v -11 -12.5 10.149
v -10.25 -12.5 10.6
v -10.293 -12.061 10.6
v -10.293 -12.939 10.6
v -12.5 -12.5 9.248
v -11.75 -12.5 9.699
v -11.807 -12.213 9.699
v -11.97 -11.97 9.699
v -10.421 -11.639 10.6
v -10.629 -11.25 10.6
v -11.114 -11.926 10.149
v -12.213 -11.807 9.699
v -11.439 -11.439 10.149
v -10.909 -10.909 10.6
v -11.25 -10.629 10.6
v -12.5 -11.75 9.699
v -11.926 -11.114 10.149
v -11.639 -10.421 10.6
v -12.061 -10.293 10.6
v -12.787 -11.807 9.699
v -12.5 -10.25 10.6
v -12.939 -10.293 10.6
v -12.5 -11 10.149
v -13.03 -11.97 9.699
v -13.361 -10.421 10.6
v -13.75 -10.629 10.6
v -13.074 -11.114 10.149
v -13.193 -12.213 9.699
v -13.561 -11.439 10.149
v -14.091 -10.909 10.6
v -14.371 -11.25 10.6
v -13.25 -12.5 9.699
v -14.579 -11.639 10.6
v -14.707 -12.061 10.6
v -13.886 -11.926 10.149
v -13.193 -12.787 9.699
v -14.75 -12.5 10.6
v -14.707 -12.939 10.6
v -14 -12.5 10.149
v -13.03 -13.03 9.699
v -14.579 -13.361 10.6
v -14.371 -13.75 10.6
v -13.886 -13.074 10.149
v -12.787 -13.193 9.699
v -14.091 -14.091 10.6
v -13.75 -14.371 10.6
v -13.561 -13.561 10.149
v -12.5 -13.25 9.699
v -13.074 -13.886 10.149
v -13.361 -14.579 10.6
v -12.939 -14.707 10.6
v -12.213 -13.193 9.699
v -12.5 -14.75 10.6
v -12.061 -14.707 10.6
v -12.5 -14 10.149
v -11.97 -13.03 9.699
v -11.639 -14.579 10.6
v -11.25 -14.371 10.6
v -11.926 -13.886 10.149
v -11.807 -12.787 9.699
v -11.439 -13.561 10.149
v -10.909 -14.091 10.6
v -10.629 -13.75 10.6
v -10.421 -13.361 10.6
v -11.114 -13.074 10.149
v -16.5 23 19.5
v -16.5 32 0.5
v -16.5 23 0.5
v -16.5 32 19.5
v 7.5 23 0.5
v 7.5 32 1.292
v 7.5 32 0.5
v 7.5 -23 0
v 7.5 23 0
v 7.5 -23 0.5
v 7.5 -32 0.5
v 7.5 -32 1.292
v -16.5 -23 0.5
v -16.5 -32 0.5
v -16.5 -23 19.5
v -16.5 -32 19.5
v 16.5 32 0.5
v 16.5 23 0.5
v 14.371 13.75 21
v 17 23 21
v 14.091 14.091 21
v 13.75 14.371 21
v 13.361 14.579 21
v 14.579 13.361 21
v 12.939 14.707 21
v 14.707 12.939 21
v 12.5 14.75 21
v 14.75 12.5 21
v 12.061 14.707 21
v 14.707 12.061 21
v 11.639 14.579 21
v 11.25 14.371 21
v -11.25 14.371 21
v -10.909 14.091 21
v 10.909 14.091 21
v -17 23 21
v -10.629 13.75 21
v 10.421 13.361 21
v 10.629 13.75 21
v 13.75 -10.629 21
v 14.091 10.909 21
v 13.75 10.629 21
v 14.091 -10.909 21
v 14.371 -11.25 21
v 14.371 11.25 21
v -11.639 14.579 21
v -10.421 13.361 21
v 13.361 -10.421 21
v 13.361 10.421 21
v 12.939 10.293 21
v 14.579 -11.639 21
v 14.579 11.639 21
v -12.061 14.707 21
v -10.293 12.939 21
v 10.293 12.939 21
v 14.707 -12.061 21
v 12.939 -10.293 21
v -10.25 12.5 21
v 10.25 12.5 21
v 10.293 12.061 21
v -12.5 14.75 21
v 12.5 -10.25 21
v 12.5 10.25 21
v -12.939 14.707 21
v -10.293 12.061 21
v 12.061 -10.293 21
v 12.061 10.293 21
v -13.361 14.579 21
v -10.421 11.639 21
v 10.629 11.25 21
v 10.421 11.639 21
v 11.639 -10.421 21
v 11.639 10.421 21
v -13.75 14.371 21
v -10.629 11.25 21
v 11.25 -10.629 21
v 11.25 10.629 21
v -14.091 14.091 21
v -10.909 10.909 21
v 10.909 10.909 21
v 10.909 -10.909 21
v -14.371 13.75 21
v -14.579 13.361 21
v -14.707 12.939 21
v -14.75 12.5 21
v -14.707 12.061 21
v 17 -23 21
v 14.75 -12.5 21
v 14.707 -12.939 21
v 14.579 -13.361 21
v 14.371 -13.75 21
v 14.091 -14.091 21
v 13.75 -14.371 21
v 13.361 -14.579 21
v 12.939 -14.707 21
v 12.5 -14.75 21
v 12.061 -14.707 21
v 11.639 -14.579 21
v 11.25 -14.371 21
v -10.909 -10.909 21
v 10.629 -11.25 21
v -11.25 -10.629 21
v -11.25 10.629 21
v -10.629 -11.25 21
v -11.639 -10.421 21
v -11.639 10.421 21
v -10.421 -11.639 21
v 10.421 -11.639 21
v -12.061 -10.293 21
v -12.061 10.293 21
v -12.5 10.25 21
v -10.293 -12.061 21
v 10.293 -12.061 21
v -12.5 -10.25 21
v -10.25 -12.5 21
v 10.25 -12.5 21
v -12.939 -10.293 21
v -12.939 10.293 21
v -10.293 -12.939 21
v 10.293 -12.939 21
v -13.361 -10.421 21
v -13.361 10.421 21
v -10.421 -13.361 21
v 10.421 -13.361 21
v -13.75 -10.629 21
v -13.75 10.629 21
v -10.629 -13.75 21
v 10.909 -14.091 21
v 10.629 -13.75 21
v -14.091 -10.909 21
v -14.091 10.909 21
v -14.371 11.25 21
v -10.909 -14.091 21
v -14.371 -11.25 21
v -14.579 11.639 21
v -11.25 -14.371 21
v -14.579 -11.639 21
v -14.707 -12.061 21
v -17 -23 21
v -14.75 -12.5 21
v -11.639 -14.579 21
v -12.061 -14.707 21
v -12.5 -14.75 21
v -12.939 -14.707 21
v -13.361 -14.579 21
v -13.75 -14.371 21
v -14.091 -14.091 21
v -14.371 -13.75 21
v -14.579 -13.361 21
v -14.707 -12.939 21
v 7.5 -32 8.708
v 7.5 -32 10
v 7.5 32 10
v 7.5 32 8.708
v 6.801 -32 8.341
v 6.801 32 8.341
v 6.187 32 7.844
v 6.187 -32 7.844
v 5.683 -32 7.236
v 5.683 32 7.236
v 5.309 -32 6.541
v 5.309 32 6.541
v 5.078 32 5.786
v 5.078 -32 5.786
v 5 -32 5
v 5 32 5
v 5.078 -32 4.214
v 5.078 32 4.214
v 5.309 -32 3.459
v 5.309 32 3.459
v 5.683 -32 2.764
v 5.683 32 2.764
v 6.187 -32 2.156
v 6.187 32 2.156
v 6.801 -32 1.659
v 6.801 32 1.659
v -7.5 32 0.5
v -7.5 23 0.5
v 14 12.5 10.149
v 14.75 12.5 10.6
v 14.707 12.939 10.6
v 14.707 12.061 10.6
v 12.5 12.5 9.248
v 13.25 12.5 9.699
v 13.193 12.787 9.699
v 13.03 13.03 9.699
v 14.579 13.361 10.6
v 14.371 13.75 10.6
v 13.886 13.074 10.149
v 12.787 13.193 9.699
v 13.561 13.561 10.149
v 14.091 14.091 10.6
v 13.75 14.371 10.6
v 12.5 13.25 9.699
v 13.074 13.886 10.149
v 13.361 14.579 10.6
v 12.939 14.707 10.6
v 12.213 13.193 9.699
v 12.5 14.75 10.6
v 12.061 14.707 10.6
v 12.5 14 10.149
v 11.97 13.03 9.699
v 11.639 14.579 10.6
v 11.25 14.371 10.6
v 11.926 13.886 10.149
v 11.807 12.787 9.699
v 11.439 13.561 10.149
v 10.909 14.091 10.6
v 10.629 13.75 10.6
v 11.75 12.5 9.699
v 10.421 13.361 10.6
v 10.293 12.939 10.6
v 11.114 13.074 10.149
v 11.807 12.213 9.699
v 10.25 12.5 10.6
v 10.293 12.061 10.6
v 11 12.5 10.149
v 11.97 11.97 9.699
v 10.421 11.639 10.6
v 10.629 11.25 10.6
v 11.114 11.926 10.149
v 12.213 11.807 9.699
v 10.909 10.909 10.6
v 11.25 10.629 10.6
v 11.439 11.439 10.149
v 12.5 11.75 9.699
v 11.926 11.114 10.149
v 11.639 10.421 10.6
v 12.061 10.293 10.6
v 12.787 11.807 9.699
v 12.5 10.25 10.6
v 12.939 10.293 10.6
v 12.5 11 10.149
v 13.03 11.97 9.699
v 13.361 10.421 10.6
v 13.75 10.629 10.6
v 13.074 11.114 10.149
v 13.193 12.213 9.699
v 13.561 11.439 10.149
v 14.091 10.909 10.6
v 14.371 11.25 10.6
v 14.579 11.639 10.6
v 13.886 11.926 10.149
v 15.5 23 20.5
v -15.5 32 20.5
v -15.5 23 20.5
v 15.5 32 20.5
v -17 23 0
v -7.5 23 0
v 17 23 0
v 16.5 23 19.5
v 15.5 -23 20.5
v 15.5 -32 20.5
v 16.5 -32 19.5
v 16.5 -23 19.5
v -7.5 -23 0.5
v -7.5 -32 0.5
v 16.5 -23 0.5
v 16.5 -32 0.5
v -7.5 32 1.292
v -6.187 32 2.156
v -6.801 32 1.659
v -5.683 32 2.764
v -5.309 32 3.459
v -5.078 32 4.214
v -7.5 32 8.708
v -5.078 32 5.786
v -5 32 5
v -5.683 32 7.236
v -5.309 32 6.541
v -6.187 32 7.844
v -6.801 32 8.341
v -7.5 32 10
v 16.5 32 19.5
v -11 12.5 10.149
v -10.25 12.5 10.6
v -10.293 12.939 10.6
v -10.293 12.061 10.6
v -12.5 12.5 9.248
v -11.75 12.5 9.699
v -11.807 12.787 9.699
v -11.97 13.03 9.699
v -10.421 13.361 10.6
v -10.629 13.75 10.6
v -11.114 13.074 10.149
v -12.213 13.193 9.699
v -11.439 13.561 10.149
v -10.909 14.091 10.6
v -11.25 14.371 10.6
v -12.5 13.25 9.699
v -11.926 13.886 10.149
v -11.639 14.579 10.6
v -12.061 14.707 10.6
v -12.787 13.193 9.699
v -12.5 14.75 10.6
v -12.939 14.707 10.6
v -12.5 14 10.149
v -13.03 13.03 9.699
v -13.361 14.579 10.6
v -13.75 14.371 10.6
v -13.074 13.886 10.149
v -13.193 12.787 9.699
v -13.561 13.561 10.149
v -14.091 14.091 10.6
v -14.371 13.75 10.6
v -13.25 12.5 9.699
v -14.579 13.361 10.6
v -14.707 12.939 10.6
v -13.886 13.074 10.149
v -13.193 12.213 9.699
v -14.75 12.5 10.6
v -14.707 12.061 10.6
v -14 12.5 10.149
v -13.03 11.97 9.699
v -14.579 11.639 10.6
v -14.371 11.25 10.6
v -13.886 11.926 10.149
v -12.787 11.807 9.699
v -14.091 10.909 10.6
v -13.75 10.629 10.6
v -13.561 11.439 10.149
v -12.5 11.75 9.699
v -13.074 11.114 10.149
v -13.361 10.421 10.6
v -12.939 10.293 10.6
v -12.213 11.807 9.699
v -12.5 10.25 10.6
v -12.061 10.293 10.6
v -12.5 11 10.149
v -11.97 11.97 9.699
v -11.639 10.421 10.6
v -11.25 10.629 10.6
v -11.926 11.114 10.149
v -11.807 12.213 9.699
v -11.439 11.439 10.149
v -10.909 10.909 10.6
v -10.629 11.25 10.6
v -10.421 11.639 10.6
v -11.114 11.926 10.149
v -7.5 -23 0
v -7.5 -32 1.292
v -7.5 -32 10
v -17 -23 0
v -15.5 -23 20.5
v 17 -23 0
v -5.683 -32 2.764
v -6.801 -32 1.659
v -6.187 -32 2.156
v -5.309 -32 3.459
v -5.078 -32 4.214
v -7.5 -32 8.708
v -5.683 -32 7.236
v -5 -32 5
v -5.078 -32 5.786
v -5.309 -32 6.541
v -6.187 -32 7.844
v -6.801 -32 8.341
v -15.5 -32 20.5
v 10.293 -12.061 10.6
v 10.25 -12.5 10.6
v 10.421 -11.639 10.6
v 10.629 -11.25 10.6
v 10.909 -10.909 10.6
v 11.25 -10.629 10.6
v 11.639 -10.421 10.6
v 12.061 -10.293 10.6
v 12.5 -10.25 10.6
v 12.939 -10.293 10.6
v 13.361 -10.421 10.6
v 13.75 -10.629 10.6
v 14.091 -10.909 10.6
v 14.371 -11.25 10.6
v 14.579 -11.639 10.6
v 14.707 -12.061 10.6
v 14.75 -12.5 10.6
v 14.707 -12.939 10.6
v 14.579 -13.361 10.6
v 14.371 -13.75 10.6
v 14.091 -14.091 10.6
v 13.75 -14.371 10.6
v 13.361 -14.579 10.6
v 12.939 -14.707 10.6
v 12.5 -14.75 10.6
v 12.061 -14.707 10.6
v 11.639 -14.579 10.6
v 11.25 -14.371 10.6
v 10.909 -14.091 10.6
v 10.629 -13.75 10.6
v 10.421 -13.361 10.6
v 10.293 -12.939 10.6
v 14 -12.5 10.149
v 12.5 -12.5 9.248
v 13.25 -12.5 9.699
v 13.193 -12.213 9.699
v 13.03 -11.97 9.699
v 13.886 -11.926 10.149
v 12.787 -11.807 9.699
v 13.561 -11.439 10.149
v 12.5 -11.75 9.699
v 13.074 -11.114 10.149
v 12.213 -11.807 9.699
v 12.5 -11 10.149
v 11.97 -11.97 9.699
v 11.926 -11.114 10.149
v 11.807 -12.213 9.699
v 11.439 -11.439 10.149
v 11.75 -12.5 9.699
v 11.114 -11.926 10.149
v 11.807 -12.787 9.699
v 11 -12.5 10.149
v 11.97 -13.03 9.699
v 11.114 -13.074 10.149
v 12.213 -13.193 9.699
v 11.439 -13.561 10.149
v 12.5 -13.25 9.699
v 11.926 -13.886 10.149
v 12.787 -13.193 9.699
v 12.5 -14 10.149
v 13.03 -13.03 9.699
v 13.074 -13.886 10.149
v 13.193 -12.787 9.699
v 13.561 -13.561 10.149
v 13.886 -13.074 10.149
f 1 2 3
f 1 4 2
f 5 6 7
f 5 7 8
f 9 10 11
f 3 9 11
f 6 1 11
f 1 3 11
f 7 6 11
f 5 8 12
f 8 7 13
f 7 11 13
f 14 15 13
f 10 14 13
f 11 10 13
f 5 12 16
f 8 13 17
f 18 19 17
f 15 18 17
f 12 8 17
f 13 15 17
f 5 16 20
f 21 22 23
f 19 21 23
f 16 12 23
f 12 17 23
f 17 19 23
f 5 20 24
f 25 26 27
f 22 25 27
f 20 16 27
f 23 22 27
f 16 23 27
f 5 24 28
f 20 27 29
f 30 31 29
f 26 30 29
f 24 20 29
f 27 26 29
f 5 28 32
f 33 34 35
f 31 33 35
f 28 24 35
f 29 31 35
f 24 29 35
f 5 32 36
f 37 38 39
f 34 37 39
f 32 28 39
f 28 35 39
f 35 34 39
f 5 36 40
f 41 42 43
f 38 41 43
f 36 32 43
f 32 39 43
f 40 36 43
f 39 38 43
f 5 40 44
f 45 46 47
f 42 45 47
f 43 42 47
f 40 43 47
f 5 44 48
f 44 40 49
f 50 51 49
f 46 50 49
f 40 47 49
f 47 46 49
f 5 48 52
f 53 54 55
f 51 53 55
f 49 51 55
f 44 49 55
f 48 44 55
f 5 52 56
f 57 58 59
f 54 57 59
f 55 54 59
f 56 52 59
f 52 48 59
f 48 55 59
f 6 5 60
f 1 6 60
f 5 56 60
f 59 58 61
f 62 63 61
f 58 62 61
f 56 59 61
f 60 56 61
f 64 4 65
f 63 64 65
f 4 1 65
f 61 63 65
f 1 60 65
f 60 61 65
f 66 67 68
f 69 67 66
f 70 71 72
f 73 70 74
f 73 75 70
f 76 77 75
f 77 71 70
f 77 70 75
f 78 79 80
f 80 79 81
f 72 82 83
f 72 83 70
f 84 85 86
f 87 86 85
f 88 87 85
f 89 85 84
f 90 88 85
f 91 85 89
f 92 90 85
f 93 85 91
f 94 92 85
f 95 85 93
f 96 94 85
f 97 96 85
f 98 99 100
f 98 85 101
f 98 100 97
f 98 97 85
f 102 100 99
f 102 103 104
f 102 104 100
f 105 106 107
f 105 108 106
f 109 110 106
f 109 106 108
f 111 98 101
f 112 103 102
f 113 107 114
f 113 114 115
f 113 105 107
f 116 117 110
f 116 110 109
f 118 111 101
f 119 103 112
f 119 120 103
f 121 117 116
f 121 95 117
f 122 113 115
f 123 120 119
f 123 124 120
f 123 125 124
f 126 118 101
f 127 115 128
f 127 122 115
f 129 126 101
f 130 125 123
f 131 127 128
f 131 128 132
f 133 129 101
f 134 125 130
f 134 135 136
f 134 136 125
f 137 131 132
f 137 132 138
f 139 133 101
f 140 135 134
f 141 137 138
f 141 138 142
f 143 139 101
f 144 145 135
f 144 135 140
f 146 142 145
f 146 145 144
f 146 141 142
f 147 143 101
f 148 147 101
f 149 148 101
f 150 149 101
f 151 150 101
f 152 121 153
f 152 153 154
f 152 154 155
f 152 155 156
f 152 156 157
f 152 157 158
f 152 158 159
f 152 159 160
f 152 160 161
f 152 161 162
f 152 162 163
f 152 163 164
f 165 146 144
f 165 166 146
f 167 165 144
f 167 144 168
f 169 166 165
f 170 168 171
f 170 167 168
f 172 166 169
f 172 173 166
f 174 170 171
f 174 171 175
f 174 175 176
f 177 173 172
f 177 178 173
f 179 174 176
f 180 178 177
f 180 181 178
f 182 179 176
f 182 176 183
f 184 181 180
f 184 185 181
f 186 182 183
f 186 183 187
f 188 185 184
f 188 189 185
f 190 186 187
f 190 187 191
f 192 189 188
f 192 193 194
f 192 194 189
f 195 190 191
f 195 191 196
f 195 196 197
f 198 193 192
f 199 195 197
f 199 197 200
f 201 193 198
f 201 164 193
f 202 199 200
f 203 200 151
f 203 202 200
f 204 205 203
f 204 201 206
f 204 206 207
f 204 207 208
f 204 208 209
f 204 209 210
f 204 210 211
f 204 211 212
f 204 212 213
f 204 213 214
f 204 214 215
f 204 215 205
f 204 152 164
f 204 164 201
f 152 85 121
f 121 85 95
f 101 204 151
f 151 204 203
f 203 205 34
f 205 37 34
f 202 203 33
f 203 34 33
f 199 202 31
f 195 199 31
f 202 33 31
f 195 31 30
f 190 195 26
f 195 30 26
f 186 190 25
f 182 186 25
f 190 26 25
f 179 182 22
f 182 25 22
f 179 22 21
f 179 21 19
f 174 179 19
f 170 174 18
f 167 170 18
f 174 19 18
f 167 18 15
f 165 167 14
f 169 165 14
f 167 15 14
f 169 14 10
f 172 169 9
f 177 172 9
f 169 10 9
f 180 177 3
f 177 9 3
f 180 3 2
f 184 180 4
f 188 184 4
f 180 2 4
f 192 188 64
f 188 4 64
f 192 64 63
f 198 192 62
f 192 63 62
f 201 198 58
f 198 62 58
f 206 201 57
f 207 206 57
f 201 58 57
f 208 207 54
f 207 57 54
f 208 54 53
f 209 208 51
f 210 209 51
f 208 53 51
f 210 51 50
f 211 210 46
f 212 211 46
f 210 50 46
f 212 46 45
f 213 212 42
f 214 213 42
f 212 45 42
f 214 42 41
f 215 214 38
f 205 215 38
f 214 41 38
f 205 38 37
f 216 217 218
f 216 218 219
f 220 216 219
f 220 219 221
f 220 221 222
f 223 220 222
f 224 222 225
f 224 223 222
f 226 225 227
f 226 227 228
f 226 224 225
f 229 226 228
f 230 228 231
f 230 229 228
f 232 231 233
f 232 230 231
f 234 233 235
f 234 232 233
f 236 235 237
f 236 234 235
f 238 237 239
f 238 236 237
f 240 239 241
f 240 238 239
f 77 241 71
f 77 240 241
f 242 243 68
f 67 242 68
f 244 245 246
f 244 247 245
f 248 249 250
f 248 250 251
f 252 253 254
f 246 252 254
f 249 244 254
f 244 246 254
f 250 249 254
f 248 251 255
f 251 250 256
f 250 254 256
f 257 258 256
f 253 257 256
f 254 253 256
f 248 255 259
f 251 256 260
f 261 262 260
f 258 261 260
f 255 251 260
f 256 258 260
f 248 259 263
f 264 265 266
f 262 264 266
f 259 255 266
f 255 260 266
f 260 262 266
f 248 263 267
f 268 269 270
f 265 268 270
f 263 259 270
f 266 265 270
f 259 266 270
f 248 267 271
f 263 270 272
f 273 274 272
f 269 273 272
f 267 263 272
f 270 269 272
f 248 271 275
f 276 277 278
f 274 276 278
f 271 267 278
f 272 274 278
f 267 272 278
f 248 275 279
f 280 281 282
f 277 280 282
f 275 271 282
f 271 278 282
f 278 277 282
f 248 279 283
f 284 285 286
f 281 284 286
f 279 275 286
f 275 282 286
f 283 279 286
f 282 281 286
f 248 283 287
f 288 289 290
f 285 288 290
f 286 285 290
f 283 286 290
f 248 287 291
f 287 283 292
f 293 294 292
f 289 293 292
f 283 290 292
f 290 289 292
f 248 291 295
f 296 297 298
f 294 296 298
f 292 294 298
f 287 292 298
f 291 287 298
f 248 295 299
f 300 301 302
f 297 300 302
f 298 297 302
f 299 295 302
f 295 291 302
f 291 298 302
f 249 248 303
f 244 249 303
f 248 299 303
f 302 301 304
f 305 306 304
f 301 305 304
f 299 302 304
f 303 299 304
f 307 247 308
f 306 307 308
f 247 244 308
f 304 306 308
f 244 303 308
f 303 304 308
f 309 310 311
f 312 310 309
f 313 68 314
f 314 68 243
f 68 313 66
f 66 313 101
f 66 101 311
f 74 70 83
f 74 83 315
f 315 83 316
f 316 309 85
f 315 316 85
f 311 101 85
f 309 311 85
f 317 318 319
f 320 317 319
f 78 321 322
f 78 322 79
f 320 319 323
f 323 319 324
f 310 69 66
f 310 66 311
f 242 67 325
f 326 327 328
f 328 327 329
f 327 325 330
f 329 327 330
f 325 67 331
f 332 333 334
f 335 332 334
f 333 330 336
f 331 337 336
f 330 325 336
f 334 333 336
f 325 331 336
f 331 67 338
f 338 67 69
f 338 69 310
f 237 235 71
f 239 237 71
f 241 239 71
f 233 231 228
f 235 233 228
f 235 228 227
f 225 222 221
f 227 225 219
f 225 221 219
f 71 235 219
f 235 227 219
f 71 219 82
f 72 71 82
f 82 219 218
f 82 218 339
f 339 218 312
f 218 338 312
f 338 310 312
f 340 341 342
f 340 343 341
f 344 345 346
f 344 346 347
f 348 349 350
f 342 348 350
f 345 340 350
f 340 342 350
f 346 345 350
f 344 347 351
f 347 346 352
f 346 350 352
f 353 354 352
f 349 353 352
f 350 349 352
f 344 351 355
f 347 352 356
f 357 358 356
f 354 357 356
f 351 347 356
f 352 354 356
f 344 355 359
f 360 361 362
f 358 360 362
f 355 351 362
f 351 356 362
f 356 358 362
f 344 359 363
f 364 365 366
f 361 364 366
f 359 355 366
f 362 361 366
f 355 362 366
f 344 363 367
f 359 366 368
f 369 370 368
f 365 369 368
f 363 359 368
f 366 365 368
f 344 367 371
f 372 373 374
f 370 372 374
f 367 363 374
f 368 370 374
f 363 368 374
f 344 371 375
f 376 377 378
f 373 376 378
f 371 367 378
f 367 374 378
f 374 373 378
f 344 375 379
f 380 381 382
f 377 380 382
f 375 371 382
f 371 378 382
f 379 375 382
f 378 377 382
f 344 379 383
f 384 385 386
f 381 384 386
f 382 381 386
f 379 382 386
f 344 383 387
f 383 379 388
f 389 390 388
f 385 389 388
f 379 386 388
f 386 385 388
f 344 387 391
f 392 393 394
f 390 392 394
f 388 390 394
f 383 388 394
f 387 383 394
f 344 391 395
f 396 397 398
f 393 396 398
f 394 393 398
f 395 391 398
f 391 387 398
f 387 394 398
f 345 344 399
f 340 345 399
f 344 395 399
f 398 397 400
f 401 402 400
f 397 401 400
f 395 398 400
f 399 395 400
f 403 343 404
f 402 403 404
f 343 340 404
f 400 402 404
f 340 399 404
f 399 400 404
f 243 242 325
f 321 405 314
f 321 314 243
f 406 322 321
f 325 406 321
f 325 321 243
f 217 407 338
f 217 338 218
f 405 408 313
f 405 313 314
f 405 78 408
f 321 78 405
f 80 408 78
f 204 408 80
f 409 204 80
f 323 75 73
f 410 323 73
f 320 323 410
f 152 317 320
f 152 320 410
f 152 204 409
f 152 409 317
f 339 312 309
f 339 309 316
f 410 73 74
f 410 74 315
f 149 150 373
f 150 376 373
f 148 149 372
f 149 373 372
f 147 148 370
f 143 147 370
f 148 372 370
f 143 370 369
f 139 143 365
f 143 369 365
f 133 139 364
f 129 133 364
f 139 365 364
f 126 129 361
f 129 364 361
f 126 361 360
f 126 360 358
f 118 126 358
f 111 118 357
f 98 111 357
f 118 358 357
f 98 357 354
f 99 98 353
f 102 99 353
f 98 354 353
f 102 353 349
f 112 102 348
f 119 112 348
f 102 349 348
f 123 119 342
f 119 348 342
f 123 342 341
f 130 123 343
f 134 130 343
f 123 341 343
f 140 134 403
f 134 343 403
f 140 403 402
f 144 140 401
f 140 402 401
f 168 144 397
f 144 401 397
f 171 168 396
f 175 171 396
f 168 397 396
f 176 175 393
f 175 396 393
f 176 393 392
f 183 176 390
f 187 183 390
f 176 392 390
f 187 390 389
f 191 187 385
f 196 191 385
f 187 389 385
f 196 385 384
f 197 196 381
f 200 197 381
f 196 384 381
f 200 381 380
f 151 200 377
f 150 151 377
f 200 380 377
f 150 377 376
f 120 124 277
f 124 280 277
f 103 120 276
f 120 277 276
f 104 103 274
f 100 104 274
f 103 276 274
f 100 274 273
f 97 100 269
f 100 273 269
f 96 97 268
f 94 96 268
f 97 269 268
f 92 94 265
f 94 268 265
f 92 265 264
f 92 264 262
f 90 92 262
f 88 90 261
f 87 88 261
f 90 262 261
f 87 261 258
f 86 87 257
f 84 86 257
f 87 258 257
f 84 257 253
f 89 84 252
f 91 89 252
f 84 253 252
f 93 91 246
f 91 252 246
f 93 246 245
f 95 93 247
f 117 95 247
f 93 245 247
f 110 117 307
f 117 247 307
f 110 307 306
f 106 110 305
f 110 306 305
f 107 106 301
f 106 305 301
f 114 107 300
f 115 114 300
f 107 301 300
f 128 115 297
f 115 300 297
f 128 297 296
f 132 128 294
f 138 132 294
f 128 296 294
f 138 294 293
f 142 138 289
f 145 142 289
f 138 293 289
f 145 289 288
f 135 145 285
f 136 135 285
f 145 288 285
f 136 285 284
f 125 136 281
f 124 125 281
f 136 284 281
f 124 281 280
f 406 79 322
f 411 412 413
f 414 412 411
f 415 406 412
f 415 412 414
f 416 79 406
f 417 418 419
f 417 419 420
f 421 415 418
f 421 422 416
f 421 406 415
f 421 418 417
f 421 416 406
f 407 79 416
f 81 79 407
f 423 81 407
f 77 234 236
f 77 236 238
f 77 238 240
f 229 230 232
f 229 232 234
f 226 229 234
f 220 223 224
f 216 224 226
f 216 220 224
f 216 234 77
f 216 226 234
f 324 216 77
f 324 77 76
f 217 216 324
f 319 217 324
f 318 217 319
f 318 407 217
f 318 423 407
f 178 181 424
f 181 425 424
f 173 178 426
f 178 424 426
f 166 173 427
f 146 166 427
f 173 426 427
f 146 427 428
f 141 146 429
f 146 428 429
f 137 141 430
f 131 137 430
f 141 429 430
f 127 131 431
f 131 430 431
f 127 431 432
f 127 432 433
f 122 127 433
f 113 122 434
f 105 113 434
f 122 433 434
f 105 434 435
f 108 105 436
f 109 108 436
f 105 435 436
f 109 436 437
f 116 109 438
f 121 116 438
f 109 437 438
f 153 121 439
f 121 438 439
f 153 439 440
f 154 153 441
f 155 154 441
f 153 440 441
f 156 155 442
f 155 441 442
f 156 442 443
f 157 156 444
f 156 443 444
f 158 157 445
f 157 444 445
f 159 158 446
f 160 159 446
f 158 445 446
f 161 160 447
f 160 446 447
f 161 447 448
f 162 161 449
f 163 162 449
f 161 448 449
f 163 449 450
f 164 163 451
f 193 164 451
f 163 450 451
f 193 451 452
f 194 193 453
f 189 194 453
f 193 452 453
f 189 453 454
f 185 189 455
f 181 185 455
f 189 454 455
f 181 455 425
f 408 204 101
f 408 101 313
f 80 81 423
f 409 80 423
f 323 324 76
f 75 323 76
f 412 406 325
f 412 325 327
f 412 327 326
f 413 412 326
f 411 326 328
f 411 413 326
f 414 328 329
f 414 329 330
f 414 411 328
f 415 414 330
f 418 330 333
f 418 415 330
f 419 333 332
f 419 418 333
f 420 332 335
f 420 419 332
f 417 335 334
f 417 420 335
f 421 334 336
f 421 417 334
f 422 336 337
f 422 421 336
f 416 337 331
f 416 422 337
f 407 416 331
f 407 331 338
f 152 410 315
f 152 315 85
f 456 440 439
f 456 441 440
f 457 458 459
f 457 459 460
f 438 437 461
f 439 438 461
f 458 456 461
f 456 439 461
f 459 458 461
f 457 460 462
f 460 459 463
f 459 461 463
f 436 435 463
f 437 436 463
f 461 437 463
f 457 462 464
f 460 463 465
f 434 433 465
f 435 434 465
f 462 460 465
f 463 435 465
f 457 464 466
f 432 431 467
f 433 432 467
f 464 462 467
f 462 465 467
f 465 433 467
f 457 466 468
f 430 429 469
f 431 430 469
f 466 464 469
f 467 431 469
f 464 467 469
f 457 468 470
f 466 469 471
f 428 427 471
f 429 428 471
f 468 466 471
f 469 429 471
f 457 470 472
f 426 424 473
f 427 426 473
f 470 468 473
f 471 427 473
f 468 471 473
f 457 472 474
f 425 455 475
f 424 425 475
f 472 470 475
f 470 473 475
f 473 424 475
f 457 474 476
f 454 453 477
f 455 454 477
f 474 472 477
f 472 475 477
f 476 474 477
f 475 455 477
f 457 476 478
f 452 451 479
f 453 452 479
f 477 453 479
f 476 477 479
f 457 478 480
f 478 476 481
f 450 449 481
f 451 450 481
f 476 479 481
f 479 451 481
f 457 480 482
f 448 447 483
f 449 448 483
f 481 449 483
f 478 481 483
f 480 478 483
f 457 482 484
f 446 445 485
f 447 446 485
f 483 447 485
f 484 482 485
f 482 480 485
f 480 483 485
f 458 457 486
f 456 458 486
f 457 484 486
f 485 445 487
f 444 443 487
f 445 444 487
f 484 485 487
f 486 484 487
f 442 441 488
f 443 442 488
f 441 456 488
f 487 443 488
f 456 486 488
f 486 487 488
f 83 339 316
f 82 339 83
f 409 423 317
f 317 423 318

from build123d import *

# Parameters (mm, degrees)
F1_DEPTH = 32
F2_W     = 34
F2_H     = 21
F3_DEPTH = 9
F5_D     = 4.5
F5_DEPTH = 10.4
F5_TIP   = 1.3519363928


# Not quite as in the source:
# - a pattern or mirror of a feature is missing from the dataset's text; its kind, count and spacing are read off the source's solid


with BuildPart() as f1:
    # F0 (on Front) → F1 (new body, symmetric)
    with BuildSketch(Plane.XZ):
        with BuildLine():
            Line((-17, 21), (-17, 0))
            Line((-17, 0), (-7.5, 0))
            Line((-7.5, 0), (-7.5, 1.2919007565))
            ThreePointArc((-7.5, 1.2919007565), (-5, 5), (-7.5, 8.7080992435))
            Line((-7.5, 8.7080992435), (-7.5, 10))
            Line((-7.5, 10), (7.5, 10))
            Line((7.5, 10), (7.5, 8.7080992435))
            ThreePointArc((7.5, 8.7080992435), (5, 5), (7.5, 1.2919007565))
            Line((7.5, 1.2919007565), (7.5, 0))
            Line((7.5, 0), (17, 0))
            Line((17, 0), (17, 21))
            Line((17, 21), (-17, 21))
        make_face()
    extrude(amount=F1_DEPTH, both=True)

    # F2 (on face) → F3 (cut)
    with BuildSketch(Plane.XZ.offset(32)):
        with Locations((0, 10.5)):
            Rectangle(F2_W, F2_H)
        Polygon((-16.5, 19.5), (-15.5, 20.5), (15.5, 20.5), (16.5, 19.5), (16.5, 0.5), (-16.5, 0.5), align=None, mode=Mode.SUBTRACT)
    f3 = extrude(amount=-F3_DEPTH, mode=Mode.SUBTRACT)

    # F3_copies: F3 across plane
    add(f3.mirror(Plane.ZX), mode=Mode.SUBTRACT)

    # F5
    with Locations(Plane.XY.offset(21)):
        with Locations((-12.5, 12.5), (12.5, 12.5), (12.5, -12.5), (-12.5, -12.5)):
            Hole(F5_D / 2, depth=F5_DEPTH)
            with Locations((0, 0, -(F5_DEPTH + F5_TIP / 2))):  # 118° drill point
                Cone(0, F5_D / 2, F5_TIP, mode=Mode.SUBTRACT)


solid = f1.part
